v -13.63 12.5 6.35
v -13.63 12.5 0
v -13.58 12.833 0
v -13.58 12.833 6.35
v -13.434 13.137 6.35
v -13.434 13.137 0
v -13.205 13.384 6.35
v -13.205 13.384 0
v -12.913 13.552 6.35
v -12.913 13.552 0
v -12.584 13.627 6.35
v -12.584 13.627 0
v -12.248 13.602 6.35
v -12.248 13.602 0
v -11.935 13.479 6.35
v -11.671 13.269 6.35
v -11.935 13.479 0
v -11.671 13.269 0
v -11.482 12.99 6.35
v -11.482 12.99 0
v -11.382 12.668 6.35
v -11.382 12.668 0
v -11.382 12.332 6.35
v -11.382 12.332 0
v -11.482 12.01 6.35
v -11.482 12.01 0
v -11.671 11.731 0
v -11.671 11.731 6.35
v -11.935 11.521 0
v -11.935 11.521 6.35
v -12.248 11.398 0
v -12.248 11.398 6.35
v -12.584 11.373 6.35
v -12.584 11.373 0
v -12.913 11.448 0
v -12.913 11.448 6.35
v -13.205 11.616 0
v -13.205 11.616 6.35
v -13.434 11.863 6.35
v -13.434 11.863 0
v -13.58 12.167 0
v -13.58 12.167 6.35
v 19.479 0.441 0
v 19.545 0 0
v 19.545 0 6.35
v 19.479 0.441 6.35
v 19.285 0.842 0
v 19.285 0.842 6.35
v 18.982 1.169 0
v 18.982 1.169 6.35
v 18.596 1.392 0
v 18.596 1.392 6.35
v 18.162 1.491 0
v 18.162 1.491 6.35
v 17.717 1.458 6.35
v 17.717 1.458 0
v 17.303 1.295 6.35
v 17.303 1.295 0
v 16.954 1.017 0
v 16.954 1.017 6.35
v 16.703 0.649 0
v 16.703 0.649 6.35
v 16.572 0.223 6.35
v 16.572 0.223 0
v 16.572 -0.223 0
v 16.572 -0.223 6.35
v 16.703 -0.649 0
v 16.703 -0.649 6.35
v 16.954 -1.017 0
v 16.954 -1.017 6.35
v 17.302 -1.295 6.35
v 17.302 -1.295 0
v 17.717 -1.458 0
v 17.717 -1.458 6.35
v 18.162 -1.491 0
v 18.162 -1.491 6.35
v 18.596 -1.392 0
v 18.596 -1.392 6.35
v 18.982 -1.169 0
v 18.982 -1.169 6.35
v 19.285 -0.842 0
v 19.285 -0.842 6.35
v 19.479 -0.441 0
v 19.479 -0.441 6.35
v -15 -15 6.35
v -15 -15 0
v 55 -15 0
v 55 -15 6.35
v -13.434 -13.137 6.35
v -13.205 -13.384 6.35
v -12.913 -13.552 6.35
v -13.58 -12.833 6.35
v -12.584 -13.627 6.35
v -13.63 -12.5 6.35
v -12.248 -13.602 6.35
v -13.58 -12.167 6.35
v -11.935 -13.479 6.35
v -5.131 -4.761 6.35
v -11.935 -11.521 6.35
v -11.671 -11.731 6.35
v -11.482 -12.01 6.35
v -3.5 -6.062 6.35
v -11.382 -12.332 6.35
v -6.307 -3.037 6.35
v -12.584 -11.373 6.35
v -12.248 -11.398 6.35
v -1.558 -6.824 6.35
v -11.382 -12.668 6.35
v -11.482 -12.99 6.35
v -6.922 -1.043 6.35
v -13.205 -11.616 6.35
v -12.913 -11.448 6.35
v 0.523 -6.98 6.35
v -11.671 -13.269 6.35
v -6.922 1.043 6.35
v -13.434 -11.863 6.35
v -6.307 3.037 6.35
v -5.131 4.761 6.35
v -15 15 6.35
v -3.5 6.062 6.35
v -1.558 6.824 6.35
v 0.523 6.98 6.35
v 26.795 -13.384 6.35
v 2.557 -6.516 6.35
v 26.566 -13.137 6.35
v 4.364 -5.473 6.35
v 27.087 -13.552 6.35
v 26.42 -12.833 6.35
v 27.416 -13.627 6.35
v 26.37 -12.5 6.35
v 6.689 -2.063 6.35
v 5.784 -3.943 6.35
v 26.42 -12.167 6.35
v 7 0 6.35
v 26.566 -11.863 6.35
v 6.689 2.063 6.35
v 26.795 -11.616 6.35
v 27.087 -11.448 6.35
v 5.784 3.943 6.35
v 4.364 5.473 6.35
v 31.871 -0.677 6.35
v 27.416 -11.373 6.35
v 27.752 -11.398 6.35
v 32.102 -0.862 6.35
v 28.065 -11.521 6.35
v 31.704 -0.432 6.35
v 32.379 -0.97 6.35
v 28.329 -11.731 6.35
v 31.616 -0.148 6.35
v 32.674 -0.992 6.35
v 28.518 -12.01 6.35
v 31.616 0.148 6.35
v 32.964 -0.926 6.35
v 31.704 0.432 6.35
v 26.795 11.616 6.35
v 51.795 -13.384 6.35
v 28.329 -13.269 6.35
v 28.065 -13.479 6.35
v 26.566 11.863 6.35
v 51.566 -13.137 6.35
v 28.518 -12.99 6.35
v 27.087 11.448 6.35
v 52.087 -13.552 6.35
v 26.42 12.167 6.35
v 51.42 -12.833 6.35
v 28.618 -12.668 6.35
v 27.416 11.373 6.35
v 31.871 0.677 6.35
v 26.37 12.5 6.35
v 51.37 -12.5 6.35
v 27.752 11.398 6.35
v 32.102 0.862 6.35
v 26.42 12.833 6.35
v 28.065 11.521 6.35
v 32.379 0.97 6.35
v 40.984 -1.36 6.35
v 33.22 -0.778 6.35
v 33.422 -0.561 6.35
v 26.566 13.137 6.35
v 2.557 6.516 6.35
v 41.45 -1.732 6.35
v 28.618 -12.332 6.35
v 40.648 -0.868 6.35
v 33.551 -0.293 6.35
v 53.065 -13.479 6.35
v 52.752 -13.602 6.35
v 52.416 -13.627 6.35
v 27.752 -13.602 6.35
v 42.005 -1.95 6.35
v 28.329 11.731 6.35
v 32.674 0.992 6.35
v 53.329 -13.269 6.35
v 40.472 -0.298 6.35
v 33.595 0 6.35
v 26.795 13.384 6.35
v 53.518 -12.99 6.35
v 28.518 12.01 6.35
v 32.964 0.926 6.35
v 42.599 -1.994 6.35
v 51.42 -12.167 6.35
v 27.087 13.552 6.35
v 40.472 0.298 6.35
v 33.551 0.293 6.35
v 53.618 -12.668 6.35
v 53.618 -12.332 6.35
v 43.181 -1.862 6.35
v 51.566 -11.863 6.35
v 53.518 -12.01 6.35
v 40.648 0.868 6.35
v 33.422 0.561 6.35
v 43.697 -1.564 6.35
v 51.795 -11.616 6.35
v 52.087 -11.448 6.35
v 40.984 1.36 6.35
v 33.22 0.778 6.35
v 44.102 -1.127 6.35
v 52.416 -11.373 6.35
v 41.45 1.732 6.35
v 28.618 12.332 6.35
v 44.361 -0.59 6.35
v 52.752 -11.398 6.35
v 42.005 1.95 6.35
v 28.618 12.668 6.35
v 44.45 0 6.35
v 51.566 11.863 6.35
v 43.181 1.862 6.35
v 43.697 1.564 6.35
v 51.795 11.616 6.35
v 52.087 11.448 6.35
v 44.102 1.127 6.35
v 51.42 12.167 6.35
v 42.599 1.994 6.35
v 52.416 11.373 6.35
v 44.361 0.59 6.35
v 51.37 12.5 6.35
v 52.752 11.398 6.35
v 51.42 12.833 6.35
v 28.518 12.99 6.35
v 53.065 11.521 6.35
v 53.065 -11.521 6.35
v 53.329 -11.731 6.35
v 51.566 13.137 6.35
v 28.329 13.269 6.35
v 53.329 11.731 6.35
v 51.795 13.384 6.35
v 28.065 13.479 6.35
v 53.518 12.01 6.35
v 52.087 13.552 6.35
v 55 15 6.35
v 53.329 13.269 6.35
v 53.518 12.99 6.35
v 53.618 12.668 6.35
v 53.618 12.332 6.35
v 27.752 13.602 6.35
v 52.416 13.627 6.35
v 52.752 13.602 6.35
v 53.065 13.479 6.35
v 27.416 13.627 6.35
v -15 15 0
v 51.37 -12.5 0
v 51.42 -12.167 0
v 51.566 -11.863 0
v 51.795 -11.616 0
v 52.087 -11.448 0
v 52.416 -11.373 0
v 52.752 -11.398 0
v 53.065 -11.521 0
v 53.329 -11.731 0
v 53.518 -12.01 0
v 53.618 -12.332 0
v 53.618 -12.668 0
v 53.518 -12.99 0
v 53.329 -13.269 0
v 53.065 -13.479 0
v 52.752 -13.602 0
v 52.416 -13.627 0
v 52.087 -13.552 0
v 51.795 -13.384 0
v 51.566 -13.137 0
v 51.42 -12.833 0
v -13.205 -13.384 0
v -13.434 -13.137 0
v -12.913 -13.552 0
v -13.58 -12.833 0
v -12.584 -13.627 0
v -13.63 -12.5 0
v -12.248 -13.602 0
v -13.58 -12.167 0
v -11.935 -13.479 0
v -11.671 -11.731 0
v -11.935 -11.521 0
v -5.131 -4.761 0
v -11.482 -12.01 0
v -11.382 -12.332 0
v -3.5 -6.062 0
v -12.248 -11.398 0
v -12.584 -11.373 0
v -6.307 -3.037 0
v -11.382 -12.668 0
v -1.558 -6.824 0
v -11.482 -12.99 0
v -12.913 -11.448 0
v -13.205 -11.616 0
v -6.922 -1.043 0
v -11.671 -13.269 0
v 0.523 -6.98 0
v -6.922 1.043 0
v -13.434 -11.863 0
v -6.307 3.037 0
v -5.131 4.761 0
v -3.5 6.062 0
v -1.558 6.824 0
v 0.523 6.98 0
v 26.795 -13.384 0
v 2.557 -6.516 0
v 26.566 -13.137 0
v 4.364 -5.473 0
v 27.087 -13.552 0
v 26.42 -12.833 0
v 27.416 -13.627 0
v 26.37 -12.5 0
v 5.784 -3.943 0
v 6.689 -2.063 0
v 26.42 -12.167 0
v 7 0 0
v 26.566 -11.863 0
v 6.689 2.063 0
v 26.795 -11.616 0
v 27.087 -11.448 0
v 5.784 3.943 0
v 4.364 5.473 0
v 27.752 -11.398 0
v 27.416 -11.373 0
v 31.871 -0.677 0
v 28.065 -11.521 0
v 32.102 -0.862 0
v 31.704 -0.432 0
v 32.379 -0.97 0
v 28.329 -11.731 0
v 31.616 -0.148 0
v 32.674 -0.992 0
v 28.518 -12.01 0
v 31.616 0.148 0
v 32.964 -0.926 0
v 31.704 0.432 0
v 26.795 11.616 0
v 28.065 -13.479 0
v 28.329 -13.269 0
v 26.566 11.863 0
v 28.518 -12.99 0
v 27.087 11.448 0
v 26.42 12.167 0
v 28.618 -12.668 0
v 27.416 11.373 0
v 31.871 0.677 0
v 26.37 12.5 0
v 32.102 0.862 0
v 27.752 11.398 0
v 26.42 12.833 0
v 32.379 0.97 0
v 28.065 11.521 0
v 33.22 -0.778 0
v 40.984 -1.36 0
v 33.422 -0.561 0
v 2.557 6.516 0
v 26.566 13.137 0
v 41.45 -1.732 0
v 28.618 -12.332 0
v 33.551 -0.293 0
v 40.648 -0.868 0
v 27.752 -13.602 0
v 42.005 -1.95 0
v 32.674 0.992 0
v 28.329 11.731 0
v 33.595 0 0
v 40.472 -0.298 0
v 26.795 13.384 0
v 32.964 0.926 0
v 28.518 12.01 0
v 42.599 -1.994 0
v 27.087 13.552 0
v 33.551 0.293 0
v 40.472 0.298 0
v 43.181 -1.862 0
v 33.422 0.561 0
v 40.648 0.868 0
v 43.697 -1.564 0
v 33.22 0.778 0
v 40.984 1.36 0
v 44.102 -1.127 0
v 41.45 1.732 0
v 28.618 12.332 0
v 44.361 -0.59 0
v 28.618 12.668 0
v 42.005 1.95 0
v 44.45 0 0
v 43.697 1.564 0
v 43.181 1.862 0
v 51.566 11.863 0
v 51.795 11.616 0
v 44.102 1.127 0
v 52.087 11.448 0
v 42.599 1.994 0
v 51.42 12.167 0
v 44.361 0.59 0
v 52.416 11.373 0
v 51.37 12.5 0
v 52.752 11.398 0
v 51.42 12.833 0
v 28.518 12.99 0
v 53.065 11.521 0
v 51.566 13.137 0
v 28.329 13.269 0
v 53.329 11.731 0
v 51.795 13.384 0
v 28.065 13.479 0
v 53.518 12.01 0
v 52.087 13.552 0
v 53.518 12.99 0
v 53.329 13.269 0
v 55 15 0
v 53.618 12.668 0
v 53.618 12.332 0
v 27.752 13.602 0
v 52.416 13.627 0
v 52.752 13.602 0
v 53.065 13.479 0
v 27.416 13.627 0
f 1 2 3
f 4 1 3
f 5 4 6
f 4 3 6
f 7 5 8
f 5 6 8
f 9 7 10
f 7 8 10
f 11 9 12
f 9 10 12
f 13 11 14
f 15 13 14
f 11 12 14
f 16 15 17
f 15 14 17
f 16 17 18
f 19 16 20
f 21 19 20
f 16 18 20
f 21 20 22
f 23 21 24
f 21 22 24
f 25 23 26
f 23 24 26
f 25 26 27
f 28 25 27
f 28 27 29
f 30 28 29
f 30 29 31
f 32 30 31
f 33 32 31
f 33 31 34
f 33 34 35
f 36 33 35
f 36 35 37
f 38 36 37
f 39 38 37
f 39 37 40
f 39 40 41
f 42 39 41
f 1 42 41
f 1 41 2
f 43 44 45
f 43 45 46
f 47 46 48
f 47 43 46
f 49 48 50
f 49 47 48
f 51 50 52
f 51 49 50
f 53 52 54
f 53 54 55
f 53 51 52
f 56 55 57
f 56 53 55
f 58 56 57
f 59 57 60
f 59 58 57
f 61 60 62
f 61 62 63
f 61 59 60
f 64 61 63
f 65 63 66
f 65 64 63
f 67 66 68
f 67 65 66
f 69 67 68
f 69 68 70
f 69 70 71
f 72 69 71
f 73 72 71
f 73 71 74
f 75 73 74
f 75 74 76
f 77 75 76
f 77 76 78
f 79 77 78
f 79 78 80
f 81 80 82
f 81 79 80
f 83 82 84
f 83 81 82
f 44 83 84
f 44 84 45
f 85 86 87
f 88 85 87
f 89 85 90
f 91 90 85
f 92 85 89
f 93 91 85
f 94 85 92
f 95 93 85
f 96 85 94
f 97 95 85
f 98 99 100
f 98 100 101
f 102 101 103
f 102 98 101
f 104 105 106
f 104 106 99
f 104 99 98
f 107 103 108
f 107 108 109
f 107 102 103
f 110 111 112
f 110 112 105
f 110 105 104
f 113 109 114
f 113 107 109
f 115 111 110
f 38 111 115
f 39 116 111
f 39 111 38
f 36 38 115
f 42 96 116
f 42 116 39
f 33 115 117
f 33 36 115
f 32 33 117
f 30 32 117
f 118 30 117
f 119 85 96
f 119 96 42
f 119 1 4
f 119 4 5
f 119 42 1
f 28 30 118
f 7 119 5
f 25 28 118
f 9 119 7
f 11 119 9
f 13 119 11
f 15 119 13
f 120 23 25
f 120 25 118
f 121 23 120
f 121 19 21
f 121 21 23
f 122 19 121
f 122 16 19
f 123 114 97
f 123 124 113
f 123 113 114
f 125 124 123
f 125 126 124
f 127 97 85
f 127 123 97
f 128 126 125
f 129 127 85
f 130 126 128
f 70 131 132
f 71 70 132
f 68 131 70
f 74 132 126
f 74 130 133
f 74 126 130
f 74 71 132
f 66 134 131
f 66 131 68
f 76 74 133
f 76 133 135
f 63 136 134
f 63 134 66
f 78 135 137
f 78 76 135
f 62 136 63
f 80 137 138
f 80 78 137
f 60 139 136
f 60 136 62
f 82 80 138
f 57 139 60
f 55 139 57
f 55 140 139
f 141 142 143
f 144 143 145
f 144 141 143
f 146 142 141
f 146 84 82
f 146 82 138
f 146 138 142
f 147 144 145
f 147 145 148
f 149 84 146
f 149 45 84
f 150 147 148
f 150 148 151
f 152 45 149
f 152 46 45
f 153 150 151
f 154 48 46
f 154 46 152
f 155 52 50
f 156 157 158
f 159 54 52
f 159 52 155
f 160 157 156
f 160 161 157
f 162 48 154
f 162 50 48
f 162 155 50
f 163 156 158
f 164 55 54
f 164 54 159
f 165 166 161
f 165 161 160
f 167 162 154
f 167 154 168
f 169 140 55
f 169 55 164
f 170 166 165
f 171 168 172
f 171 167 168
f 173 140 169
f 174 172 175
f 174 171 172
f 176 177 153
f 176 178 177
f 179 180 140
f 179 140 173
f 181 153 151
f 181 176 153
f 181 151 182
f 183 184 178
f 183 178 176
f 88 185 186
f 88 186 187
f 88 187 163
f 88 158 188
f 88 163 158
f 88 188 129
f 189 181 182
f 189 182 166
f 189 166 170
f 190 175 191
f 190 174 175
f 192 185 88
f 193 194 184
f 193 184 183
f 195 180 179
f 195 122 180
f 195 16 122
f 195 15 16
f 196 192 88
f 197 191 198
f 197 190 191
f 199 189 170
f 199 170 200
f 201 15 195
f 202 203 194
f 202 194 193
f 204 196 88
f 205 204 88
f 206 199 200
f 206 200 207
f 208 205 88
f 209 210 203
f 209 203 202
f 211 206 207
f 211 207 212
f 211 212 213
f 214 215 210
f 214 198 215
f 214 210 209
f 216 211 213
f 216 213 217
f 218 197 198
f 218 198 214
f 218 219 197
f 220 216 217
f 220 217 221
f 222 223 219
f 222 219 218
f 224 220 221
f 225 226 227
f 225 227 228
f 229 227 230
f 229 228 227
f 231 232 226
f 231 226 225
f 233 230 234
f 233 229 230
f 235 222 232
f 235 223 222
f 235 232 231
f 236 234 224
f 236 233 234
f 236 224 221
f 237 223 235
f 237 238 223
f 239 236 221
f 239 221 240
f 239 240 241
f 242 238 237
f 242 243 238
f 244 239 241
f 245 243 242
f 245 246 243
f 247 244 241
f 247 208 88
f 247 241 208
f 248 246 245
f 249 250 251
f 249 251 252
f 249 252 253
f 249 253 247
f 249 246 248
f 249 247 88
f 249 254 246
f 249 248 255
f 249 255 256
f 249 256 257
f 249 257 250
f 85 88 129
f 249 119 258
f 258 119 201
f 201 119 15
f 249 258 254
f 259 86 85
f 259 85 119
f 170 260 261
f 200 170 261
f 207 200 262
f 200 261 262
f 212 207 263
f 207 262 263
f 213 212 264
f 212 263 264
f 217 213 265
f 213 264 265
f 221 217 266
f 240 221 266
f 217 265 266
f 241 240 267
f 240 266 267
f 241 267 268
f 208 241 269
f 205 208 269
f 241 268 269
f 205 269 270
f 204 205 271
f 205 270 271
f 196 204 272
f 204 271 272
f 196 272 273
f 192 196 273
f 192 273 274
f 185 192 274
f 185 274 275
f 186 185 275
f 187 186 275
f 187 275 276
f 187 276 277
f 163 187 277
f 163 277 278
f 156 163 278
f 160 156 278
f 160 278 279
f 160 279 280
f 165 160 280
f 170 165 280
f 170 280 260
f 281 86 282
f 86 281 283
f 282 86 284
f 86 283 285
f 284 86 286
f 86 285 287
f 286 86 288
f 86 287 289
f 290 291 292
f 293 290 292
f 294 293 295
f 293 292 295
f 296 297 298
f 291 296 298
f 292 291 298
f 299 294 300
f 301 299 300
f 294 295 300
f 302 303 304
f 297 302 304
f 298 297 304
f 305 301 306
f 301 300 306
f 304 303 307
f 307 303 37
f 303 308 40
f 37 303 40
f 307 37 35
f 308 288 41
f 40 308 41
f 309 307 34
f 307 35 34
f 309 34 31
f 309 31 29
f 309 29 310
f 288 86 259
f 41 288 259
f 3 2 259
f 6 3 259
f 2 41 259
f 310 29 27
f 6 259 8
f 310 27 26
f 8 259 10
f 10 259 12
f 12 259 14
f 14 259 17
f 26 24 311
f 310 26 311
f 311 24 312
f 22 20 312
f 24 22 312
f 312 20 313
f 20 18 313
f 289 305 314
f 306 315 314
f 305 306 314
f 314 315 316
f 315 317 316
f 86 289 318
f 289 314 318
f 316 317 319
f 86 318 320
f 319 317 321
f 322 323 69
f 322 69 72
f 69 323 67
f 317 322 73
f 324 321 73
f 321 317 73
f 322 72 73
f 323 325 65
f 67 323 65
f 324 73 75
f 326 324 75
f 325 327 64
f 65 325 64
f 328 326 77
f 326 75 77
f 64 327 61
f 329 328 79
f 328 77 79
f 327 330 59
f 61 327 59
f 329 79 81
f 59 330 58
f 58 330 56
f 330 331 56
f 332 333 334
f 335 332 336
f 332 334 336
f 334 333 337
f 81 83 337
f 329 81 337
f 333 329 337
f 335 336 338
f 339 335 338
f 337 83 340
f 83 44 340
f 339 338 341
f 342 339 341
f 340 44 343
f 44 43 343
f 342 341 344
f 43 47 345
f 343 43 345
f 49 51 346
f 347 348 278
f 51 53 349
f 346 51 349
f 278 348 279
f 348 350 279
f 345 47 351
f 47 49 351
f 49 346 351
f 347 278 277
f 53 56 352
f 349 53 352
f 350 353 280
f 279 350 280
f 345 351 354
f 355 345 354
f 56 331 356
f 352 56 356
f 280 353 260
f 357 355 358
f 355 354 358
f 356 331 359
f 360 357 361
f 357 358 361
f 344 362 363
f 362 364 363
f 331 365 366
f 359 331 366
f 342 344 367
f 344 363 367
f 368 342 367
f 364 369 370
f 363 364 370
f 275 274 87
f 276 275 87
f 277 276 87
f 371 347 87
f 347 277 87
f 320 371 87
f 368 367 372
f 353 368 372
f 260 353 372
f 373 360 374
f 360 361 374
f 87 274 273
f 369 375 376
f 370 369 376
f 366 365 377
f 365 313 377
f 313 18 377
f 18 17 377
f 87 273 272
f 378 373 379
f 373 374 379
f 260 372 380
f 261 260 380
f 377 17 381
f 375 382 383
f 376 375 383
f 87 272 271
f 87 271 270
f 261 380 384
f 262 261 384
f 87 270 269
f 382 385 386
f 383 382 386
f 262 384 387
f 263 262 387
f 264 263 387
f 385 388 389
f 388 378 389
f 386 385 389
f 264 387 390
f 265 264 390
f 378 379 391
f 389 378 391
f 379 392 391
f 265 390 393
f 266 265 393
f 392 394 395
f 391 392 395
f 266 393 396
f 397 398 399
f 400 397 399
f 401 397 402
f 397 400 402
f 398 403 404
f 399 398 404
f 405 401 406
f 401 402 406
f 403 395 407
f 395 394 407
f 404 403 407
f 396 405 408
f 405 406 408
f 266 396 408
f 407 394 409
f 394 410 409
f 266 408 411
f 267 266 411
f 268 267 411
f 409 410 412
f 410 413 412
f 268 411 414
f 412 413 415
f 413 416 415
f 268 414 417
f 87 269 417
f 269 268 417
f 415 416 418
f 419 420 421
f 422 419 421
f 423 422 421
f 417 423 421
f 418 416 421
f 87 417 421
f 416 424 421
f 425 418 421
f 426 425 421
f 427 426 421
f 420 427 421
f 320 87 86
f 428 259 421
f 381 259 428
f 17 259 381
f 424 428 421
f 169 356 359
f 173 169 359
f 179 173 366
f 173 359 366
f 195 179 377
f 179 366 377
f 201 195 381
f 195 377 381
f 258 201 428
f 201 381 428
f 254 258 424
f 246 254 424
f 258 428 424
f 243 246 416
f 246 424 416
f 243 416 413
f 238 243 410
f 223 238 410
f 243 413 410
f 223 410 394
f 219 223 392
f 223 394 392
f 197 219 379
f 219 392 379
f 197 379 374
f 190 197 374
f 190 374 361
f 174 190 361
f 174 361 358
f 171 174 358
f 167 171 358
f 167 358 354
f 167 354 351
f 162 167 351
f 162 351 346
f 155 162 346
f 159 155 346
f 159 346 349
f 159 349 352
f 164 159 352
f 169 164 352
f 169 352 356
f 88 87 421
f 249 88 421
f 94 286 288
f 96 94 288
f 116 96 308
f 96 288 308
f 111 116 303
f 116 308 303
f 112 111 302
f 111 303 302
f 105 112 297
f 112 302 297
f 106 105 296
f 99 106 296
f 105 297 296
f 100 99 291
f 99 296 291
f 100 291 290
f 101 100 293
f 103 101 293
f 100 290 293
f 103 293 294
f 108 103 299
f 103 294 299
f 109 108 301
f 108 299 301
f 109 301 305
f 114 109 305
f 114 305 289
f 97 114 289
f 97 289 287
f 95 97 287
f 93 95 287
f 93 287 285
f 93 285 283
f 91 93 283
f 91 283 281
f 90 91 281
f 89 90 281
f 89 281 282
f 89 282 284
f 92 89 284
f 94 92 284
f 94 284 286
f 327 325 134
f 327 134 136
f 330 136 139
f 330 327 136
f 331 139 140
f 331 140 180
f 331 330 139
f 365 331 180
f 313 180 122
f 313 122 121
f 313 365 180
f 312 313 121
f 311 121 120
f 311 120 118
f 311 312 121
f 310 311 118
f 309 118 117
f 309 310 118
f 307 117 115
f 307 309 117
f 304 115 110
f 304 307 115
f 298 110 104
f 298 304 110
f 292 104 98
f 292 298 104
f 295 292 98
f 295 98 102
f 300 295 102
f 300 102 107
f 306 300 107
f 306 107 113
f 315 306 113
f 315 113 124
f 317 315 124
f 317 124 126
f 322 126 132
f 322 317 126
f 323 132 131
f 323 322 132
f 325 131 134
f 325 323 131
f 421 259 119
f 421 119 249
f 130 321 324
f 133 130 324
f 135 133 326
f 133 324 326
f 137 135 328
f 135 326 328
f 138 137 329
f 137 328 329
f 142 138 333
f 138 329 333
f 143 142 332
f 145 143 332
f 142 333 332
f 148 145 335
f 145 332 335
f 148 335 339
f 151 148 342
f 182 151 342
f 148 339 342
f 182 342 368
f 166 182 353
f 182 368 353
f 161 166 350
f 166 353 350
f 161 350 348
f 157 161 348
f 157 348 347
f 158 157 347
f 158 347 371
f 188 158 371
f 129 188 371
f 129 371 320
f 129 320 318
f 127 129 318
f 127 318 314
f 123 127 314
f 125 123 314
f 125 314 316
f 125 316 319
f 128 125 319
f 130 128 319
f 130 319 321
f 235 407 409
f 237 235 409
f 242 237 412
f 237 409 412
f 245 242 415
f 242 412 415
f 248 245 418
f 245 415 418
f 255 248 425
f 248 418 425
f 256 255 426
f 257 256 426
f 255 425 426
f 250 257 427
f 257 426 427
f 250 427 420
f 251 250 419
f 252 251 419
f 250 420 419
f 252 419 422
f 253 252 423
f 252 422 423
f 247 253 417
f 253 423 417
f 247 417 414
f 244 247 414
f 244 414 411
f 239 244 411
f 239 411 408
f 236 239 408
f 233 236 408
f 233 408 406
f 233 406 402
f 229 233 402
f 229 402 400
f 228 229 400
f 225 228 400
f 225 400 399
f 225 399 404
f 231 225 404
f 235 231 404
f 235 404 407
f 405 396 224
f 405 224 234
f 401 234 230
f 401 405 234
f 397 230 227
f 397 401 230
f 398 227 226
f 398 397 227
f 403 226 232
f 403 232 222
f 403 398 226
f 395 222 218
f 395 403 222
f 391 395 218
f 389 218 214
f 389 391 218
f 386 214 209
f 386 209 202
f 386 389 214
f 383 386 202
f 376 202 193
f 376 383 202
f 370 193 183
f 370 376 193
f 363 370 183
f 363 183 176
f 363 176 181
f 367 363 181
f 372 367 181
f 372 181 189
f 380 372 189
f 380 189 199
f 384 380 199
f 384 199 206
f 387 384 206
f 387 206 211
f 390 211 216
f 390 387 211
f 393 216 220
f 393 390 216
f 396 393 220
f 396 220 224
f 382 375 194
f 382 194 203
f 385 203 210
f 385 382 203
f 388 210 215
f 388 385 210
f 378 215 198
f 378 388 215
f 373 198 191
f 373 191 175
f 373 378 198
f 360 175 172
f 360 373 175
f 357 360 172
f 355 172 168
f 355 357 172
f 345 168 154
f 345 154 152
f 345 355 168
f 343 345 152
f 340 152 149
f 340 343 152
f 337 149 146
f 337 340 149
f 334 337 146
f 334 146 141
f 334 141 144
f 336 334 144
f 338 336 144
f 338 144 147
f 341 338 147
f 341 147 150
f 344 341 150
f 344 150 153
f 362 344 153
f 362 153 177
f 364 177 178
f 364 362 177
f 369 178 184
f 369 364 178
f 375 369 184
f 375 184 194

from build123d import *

# Parameters (mm, degrees)
SKETCH1_W             = 70
SKETCH1_H             = 30
SKETCH1_R             = 7
SKETCH1_R_2           = 1.495
SKETCH1_R_3           = 0.995
SKETCH1_R_4           = 2
BOSS_EXTRUDE1_DEPTH   = 6.35
F_2_CLEARANCE_HOLE1_D = 2.2606


with BuildPart() as part:
    # Sketch1 → Boss-Extrude1 (new body)
    with BuildSketch(Plane.XY):
        with Locations((20, 0)):
            Rectangle(SKETCH1_W, SKETCH1_H)
        Circle(SKETCH1_R, mode=Mode.SUBTRACT)
        with Locations((18.05, 0)):
            Circle(SKETCH1_R_2, mode=Mode.SUBTRACT)
        with Locations((32.6, 0)):
            Circle(SKETCH1_R_3, mode=Mode.SUBTRACT)
        with Locations((42.449999958, 0)):
            Circle(SKETCH1_R_4, mode=Mode.SUBTRACT)
    extrude(amount=BOSS_EXTRUDE1_DEPTH)

    # #2 Clearance Hole1 (through all)
    with Locations(Plane.XY.offset(6.35)):
        with Locations((-12.5, 12.5), (-12.5, -12.5), (27.5, 12.5), (27.5, -12.5), (52.5, 12.5), (52.5, -12.5)):
            Hole(F_2_CLEARANCE_HOLE1_D / 2)


solid = part.part
